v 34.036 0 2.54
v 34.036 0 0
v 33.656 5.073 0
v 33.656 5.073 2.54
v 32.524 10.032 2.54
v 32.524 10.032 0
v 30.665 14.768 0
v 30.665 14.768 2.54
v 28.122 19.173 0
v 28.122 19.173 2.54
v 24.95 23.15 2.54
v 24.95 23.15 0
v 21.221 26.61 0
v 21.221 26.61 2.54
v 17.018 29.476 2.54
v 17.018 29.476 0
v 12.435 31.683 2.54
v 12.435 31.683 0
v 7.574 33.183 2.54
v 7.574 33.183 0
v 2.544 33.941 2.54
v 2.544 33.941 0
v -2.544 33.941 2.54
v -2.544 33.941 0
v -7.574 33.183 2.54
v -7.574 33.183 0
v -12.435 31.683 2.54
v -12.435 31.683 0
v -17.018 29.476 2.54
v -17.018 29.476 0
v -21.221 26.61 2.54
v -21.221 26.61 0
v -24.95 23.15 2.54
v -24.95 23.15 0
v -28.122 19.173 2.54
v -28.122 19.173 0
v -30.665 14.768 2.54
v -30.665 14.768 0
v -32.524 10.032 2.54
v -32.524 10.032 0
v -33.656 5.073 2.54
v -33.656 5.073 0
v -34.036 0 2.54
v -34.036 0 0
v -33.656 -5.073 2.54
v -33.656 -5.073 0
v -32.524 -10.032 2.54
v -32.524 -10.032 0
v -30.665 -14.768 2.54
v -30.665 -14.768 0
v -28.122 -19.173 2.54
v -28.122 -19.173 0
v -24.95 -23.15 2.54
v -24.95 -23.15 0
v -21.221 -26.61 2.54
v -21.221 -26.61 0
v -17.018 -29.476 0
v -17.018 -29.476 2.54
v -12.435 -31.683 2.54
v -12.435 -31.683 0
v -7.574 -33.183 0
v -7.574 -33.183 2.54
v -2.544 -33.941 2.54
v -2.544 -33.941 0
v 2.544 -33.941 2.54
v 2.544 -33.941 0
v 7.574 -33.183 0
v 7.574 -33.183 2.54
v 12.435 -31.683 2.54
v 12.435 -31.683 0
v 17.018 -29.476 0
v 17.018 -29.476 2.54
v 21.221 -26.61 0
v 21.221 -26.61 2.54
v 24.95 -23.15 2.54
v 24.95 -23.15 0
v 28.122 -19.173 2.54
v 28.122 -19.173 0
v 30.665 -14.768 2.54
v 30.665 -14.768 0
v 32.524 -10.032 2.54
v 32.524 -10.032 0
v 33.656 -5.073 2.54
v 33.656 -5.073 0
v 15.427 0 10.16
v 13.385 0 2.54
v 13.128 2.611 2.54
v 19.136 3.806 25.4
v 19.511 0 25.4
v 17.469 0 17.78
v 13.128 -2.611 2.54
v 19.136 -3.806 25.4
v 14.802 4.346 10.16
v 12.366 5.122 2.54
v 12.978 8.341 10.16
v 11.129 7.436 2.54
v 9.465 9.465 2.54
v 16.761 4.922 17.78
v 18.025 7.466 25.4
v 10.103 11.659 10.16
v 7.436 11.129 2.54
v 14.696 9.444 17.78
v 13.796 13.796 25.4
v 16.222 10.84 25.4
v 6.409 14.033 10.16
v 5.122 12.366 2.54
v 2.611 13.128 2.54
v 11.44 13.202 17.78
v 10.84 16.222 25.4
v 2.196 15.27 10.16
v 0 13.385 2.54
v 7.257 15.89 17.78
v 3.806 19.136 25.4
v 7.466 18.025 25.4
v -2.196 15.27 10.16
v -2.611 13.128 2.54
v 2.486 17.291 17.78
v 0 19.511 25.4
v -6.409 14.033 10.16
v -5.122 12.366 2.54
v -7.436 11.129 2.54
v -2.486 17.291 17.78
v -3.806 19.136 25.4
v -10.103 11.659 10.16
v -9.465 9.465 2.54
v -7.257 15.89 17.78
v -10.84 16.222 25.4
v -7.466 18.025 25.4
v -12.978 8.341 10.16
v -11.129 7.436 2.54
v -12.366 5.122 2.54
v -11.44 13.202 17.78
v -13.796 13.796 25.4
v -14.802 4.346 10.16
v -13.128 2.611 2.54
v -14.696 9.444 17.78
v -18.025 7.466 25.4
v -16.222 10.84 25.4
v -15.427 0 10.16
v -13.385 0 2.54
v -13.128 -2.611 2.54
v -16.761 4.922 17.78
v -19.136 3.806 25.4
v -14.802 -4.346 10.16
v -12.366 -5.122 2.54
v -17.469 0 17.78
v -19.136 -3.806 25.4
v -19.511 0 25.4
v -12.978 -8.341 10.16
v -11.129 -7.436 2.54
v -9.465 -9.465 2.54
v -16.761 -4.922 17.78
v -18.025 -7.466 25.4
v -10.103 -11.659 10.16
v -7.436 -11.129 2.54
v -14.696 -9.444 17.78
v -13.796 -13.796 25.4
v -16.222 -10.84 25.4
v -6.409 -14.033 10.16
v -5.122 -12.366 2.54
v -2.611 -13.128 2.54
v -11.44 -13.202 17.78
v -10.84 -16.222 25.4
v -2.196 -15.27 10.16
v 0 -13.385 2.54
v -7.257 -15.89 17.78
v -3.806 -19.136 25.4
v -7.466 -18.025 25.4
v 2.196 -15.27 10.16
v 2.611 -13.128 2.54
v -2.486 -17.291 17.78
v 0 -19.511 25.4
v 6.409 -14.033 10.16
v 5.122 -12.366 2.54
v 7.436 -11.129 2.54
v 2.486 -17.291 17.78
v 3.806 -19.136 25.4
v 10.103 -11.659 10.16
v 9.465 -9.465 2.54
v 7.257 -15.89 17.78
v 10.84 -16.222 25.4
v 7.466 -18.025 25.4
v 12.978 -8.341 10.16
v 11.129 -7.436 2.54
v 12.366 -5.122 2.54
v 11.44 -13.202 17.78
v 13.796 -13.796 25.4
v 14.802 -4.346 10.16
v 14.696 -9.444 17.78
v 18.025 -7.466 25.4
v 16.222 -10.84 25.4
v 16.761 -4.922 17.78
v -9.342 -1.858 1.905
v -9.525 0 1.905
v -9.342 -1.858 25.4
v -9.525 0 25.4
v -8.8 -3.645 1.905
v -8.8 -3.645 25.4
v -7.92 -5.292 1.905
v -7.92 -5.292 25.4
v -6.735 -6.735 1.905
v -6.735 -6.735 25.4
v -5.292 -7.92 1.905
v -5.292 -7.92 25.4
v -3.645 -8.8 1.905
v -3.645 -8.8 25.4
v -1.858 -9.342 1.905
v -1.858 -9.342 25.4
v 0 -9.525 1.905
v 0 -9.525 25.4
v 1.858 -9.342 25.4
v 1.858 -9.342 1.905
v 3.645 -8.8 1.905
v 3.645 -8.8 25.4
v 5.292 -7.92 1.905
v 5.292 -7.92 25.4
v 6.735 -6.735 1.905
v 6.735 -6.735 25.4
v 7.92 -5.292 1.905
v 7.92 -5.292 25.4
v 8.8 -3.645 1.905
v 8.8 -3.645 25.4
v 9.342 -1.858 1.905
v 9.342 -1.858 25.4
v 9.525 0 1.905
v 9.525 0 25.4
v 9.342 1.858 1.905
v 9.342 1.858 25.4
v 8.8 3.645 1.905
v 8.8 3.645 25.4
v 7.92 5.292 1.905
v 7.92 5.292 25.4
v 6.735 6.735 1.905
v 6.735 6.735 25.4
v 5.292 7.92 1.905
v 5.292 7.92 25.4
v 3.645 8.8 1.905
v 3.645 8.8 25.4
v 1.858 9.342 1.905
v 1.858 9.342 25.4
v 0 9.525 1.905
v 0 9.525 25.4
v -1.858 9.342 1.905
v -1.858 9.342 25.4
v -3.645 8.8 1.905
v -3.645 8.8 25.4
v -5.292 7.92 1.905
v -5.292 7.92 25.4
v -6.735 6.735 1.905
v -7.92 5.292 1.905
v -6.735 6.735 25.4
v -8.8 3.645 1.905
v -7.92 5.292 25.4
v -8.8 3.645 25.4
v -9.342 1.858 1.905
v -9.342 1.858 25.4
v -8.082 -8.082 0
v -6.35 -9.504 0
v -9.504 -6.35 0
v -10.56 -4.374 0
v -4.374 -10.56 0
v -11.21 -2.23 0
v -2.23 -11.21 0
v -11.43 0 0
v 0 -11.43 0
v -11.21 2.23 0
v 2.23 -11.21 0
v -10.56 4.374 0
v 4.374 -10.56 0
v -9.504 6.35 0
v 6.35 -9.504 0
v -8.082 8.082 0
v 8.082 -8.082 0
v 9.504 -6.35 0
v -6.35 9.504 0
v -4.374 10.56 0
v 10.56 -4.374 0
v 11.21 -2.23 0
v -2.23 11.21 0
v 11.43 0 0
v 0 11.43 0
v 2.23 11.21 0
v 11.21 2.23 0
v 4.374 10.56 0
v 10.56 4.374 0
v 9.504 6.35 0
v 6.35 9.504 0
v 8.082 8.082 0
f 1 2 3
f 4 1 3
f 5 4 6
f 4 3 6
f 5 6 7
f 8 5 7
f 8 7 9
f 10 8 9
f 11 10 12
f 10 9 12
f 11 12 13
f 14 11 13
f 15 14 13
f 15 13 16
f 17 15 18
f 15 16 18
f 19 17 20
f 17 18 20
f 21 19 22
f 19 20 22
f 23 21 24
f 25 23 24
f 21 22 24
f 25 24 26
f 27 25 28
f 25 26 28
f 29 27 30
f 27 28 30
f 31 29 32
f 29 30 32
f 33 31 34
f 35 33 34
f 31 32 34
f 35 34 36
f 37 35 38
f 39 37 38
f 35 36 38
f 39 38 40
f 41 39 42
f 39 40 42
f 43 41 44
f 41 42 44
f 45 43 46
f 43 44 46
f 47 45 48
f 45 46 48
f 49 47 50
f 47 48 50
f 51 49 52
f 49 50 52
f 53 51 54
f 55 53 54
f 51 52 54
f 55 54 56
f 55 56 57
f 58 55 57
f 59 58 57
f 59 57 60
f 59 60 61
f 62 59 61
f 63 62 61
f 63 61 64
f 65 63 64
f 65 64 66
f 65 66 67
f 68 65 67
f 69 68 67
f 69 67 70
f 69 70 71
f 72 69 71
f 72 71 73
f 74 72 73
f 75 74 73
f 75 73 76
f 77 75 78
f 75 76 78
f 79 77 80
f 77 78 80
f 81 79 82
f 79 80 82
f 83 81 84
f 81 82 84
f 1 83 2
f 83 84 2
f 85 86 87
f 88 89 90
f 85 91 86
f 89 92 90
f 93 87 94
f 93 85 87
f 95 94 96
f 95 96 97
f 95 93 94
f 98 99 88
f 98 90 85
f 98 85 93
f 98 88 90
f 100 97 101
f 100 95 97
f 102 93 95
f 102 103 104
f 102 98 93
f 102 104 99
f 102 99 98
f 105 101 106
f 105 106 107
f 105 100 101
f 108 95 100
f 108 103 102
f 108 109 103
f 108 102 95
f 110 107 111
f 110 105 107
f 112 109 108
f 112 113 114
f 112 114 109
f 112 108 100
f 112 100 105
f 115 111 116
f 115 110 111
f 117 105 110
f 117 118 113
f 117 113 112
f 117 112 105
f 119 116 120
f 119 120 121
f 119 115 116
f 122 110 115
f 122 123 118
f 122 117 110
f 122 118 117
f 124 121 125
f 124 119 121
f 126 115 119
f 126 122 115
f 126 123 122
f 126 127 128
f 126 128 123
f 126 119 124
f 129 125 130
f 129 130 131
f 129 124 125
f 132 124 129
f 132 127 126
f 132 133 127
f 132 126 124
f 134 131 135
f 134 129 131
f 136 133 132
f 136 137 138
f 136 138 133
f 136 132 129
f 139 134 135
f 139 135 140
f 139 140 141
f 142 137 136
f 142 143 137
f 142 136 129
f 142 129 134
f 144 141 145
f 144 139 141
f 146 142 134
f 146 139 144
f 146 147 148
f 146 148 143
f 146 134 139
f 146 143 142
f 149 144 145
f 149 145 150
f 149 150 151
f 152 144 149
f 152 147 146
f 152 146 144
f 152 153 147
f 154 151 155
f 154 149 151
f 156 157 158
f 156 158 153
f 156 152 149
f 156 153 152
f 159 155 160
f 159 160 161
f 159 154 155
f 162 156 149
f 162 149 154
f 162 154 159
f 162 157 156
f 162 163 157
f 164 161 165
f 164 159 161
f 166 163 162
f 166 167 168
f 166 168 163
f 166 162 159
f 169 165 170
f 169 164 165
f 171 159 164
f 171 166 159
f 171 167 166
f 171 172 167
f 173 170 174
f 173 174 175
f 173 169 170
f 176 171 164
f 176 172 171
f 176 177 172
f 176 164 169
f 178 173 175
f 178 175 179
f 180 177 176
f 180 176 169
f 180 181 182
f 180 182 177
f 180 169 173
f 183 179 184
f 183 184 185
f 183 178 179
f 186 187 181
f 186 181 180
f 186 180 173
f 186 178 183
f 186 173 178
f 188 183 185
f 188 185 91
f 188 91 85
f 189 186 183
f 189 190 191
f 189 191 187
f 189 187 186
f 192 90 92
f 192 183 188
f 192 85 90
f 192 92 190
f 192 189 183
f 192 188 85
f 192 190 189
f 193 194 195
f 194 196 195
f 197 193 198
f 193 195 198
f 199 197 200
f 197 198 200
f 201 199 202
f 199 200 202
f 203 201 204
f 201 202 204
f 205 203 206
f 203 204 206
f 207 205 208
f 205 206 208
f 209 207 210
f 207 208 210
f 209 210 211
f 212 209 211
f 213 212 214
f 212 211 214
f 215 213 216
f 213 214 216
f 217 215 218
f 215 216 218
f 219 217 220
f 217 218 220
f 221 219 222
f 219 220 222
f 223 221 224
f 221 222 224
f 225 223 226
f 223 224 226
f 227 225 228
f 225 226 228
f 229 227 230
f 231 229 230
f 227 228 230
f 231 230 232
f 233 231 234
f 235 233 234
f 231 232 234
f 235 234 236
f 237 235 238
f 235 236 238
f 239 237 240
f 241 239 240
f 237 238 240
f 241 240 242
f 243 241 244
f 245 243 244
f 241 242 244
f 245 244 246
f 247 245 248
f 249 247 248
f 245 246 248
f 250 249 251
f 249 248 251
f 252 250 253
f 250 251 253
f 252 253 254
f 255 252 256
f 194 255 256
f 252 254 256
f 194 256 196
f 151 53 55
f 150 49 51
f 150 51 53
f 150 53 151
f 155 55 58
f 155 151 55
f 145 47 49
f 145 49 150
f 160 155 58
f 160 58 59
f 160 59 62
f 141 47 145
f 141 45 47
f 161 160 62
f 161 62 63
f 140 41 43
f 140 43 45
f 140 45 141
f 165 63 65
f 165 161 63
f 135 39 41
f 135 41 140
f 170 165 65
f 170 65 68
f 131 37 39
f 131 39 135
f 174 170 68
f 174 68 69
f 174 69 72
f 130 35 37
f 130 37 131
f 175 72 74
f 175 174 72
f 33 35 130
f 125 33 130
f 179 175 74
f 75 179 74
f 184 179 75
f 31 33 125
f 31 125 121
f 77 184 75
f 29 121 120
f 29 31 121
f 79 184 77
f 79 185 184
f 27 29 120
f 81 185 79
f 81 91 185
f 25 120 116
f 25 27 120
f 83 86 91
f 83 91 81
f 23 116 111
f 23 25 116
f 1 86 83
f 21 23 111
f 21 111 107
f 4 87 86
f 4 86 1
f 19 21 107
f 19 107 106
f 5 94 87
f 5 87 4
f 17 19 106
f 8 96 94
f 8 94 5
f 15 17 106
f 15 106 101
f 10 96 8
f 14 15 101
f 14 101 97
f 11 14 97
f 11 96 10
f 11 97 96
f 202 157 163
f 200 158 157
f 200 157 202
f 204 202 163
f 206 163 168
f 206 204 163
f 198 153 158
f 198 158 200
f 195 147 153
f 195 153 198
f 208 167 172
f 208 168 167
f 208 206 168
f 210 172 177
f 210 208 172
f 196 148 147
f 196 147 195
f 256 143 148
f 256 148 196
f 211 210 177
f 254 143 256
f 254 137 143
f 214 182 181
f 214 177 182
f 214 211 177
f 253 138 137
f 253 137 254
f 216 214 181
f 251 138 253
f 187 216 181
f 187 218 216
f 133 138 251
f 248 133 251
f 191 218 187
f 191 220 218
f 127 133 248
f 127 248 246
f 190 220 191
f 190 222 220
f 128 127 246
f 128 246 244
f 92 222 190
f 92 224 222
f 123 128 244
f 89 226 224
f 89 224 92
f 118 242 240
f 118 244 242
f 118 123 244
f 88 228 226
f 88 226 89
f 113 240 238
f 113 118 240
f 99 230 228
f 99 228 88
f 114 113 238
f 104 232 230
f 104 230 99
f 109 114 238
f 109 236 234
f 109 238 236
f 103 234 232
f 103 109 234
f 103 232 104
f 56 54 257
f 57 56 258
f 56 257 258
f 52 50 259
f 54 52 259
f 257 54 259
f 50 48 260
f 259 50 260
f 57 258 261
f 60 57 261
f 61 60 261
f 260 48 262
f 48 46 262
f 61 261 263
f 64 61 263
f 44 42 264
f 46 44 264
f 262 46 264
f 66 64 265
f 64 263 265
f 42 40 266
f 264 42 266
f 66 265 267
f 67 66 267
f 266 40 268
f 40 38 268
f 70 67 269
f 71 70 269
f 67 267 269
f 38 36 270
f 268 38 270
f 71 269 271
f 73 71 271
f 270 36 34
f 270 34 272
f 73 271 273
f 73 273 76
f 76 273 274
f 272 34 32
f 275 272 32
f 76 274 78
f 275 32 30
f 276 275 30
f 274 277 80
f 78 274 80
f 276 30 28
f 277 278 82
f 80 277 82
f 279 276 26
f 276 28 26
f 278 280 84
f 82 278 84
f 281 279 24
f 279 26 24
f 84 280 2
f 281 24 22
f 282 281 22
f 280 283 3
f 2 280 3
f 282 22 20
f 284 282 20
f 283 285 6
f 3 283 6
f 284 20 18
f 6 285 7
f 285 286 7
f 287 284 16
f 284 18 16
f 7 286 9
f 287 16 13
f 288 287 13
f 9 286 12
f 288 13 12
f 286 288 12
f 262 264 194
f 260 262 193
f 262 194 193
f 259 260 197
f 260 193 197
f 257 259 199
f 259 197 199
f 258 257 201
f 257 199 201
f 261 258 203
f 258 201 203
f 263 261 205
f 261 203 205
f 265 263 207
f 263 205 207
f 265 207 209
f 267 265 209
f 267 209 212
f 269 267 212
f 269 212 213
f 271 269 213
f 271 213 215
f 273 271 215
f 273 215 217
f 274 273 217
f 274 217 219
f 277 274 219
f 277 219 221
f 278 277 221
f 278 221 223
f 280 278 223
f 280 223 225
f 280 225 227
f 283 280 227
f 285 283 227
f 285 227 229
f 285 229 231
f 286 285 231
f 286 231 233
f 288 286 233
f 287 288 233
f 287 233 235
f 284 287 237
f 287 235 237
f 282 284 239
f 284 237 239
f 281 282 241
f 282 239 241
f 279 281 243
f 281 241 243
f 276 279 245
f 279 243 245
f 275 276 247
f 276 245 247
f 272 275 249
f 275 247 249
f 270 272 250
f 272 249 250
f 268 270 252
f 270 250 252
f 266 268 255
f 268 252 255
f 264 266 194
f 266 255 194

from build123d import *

# Parameters (mm, degrees)
F0_R           = 34.036
F0_R_2         = 6.35
F1_DEPTH       = 2.54
F2_R           = 12.7047221092
F3_DEPTH       = 25.4
F3_TAPER       = -15
F5_D           = 19.05
F5_CSINK_D     = 22.86
F5_CSINK_ANGLE = 90


with BuildPart() as f1:
    # F0 (on Top) → F1 (new body)
    with BuildSketch(Plane.XY):
        Circle(F0_R)
        Circle(F0_R_2, mode=Mode.SUBTRACT)
    extrude(amount=F1_DEPTH)

    # F2 (on Top) → F3 (join)
    with BuildSketch(Plane.XY):
        Circle(F2_R)
    extrude(amount=F3_DEPTH, taper=F3_TAPER)

    # F5 (through all)
    with Locations(Plane(origin=(0, 0, 0), x_dir=(1, 0, 0), z_dir=(0, 0, -1))):
        with Locations((0, 0)):
            CounterSinkHole(F5_D / 2, F5_CSINK_D / 2, counter_sink_angle=F5_CSINK_ANGLE)


solid = f1.part
